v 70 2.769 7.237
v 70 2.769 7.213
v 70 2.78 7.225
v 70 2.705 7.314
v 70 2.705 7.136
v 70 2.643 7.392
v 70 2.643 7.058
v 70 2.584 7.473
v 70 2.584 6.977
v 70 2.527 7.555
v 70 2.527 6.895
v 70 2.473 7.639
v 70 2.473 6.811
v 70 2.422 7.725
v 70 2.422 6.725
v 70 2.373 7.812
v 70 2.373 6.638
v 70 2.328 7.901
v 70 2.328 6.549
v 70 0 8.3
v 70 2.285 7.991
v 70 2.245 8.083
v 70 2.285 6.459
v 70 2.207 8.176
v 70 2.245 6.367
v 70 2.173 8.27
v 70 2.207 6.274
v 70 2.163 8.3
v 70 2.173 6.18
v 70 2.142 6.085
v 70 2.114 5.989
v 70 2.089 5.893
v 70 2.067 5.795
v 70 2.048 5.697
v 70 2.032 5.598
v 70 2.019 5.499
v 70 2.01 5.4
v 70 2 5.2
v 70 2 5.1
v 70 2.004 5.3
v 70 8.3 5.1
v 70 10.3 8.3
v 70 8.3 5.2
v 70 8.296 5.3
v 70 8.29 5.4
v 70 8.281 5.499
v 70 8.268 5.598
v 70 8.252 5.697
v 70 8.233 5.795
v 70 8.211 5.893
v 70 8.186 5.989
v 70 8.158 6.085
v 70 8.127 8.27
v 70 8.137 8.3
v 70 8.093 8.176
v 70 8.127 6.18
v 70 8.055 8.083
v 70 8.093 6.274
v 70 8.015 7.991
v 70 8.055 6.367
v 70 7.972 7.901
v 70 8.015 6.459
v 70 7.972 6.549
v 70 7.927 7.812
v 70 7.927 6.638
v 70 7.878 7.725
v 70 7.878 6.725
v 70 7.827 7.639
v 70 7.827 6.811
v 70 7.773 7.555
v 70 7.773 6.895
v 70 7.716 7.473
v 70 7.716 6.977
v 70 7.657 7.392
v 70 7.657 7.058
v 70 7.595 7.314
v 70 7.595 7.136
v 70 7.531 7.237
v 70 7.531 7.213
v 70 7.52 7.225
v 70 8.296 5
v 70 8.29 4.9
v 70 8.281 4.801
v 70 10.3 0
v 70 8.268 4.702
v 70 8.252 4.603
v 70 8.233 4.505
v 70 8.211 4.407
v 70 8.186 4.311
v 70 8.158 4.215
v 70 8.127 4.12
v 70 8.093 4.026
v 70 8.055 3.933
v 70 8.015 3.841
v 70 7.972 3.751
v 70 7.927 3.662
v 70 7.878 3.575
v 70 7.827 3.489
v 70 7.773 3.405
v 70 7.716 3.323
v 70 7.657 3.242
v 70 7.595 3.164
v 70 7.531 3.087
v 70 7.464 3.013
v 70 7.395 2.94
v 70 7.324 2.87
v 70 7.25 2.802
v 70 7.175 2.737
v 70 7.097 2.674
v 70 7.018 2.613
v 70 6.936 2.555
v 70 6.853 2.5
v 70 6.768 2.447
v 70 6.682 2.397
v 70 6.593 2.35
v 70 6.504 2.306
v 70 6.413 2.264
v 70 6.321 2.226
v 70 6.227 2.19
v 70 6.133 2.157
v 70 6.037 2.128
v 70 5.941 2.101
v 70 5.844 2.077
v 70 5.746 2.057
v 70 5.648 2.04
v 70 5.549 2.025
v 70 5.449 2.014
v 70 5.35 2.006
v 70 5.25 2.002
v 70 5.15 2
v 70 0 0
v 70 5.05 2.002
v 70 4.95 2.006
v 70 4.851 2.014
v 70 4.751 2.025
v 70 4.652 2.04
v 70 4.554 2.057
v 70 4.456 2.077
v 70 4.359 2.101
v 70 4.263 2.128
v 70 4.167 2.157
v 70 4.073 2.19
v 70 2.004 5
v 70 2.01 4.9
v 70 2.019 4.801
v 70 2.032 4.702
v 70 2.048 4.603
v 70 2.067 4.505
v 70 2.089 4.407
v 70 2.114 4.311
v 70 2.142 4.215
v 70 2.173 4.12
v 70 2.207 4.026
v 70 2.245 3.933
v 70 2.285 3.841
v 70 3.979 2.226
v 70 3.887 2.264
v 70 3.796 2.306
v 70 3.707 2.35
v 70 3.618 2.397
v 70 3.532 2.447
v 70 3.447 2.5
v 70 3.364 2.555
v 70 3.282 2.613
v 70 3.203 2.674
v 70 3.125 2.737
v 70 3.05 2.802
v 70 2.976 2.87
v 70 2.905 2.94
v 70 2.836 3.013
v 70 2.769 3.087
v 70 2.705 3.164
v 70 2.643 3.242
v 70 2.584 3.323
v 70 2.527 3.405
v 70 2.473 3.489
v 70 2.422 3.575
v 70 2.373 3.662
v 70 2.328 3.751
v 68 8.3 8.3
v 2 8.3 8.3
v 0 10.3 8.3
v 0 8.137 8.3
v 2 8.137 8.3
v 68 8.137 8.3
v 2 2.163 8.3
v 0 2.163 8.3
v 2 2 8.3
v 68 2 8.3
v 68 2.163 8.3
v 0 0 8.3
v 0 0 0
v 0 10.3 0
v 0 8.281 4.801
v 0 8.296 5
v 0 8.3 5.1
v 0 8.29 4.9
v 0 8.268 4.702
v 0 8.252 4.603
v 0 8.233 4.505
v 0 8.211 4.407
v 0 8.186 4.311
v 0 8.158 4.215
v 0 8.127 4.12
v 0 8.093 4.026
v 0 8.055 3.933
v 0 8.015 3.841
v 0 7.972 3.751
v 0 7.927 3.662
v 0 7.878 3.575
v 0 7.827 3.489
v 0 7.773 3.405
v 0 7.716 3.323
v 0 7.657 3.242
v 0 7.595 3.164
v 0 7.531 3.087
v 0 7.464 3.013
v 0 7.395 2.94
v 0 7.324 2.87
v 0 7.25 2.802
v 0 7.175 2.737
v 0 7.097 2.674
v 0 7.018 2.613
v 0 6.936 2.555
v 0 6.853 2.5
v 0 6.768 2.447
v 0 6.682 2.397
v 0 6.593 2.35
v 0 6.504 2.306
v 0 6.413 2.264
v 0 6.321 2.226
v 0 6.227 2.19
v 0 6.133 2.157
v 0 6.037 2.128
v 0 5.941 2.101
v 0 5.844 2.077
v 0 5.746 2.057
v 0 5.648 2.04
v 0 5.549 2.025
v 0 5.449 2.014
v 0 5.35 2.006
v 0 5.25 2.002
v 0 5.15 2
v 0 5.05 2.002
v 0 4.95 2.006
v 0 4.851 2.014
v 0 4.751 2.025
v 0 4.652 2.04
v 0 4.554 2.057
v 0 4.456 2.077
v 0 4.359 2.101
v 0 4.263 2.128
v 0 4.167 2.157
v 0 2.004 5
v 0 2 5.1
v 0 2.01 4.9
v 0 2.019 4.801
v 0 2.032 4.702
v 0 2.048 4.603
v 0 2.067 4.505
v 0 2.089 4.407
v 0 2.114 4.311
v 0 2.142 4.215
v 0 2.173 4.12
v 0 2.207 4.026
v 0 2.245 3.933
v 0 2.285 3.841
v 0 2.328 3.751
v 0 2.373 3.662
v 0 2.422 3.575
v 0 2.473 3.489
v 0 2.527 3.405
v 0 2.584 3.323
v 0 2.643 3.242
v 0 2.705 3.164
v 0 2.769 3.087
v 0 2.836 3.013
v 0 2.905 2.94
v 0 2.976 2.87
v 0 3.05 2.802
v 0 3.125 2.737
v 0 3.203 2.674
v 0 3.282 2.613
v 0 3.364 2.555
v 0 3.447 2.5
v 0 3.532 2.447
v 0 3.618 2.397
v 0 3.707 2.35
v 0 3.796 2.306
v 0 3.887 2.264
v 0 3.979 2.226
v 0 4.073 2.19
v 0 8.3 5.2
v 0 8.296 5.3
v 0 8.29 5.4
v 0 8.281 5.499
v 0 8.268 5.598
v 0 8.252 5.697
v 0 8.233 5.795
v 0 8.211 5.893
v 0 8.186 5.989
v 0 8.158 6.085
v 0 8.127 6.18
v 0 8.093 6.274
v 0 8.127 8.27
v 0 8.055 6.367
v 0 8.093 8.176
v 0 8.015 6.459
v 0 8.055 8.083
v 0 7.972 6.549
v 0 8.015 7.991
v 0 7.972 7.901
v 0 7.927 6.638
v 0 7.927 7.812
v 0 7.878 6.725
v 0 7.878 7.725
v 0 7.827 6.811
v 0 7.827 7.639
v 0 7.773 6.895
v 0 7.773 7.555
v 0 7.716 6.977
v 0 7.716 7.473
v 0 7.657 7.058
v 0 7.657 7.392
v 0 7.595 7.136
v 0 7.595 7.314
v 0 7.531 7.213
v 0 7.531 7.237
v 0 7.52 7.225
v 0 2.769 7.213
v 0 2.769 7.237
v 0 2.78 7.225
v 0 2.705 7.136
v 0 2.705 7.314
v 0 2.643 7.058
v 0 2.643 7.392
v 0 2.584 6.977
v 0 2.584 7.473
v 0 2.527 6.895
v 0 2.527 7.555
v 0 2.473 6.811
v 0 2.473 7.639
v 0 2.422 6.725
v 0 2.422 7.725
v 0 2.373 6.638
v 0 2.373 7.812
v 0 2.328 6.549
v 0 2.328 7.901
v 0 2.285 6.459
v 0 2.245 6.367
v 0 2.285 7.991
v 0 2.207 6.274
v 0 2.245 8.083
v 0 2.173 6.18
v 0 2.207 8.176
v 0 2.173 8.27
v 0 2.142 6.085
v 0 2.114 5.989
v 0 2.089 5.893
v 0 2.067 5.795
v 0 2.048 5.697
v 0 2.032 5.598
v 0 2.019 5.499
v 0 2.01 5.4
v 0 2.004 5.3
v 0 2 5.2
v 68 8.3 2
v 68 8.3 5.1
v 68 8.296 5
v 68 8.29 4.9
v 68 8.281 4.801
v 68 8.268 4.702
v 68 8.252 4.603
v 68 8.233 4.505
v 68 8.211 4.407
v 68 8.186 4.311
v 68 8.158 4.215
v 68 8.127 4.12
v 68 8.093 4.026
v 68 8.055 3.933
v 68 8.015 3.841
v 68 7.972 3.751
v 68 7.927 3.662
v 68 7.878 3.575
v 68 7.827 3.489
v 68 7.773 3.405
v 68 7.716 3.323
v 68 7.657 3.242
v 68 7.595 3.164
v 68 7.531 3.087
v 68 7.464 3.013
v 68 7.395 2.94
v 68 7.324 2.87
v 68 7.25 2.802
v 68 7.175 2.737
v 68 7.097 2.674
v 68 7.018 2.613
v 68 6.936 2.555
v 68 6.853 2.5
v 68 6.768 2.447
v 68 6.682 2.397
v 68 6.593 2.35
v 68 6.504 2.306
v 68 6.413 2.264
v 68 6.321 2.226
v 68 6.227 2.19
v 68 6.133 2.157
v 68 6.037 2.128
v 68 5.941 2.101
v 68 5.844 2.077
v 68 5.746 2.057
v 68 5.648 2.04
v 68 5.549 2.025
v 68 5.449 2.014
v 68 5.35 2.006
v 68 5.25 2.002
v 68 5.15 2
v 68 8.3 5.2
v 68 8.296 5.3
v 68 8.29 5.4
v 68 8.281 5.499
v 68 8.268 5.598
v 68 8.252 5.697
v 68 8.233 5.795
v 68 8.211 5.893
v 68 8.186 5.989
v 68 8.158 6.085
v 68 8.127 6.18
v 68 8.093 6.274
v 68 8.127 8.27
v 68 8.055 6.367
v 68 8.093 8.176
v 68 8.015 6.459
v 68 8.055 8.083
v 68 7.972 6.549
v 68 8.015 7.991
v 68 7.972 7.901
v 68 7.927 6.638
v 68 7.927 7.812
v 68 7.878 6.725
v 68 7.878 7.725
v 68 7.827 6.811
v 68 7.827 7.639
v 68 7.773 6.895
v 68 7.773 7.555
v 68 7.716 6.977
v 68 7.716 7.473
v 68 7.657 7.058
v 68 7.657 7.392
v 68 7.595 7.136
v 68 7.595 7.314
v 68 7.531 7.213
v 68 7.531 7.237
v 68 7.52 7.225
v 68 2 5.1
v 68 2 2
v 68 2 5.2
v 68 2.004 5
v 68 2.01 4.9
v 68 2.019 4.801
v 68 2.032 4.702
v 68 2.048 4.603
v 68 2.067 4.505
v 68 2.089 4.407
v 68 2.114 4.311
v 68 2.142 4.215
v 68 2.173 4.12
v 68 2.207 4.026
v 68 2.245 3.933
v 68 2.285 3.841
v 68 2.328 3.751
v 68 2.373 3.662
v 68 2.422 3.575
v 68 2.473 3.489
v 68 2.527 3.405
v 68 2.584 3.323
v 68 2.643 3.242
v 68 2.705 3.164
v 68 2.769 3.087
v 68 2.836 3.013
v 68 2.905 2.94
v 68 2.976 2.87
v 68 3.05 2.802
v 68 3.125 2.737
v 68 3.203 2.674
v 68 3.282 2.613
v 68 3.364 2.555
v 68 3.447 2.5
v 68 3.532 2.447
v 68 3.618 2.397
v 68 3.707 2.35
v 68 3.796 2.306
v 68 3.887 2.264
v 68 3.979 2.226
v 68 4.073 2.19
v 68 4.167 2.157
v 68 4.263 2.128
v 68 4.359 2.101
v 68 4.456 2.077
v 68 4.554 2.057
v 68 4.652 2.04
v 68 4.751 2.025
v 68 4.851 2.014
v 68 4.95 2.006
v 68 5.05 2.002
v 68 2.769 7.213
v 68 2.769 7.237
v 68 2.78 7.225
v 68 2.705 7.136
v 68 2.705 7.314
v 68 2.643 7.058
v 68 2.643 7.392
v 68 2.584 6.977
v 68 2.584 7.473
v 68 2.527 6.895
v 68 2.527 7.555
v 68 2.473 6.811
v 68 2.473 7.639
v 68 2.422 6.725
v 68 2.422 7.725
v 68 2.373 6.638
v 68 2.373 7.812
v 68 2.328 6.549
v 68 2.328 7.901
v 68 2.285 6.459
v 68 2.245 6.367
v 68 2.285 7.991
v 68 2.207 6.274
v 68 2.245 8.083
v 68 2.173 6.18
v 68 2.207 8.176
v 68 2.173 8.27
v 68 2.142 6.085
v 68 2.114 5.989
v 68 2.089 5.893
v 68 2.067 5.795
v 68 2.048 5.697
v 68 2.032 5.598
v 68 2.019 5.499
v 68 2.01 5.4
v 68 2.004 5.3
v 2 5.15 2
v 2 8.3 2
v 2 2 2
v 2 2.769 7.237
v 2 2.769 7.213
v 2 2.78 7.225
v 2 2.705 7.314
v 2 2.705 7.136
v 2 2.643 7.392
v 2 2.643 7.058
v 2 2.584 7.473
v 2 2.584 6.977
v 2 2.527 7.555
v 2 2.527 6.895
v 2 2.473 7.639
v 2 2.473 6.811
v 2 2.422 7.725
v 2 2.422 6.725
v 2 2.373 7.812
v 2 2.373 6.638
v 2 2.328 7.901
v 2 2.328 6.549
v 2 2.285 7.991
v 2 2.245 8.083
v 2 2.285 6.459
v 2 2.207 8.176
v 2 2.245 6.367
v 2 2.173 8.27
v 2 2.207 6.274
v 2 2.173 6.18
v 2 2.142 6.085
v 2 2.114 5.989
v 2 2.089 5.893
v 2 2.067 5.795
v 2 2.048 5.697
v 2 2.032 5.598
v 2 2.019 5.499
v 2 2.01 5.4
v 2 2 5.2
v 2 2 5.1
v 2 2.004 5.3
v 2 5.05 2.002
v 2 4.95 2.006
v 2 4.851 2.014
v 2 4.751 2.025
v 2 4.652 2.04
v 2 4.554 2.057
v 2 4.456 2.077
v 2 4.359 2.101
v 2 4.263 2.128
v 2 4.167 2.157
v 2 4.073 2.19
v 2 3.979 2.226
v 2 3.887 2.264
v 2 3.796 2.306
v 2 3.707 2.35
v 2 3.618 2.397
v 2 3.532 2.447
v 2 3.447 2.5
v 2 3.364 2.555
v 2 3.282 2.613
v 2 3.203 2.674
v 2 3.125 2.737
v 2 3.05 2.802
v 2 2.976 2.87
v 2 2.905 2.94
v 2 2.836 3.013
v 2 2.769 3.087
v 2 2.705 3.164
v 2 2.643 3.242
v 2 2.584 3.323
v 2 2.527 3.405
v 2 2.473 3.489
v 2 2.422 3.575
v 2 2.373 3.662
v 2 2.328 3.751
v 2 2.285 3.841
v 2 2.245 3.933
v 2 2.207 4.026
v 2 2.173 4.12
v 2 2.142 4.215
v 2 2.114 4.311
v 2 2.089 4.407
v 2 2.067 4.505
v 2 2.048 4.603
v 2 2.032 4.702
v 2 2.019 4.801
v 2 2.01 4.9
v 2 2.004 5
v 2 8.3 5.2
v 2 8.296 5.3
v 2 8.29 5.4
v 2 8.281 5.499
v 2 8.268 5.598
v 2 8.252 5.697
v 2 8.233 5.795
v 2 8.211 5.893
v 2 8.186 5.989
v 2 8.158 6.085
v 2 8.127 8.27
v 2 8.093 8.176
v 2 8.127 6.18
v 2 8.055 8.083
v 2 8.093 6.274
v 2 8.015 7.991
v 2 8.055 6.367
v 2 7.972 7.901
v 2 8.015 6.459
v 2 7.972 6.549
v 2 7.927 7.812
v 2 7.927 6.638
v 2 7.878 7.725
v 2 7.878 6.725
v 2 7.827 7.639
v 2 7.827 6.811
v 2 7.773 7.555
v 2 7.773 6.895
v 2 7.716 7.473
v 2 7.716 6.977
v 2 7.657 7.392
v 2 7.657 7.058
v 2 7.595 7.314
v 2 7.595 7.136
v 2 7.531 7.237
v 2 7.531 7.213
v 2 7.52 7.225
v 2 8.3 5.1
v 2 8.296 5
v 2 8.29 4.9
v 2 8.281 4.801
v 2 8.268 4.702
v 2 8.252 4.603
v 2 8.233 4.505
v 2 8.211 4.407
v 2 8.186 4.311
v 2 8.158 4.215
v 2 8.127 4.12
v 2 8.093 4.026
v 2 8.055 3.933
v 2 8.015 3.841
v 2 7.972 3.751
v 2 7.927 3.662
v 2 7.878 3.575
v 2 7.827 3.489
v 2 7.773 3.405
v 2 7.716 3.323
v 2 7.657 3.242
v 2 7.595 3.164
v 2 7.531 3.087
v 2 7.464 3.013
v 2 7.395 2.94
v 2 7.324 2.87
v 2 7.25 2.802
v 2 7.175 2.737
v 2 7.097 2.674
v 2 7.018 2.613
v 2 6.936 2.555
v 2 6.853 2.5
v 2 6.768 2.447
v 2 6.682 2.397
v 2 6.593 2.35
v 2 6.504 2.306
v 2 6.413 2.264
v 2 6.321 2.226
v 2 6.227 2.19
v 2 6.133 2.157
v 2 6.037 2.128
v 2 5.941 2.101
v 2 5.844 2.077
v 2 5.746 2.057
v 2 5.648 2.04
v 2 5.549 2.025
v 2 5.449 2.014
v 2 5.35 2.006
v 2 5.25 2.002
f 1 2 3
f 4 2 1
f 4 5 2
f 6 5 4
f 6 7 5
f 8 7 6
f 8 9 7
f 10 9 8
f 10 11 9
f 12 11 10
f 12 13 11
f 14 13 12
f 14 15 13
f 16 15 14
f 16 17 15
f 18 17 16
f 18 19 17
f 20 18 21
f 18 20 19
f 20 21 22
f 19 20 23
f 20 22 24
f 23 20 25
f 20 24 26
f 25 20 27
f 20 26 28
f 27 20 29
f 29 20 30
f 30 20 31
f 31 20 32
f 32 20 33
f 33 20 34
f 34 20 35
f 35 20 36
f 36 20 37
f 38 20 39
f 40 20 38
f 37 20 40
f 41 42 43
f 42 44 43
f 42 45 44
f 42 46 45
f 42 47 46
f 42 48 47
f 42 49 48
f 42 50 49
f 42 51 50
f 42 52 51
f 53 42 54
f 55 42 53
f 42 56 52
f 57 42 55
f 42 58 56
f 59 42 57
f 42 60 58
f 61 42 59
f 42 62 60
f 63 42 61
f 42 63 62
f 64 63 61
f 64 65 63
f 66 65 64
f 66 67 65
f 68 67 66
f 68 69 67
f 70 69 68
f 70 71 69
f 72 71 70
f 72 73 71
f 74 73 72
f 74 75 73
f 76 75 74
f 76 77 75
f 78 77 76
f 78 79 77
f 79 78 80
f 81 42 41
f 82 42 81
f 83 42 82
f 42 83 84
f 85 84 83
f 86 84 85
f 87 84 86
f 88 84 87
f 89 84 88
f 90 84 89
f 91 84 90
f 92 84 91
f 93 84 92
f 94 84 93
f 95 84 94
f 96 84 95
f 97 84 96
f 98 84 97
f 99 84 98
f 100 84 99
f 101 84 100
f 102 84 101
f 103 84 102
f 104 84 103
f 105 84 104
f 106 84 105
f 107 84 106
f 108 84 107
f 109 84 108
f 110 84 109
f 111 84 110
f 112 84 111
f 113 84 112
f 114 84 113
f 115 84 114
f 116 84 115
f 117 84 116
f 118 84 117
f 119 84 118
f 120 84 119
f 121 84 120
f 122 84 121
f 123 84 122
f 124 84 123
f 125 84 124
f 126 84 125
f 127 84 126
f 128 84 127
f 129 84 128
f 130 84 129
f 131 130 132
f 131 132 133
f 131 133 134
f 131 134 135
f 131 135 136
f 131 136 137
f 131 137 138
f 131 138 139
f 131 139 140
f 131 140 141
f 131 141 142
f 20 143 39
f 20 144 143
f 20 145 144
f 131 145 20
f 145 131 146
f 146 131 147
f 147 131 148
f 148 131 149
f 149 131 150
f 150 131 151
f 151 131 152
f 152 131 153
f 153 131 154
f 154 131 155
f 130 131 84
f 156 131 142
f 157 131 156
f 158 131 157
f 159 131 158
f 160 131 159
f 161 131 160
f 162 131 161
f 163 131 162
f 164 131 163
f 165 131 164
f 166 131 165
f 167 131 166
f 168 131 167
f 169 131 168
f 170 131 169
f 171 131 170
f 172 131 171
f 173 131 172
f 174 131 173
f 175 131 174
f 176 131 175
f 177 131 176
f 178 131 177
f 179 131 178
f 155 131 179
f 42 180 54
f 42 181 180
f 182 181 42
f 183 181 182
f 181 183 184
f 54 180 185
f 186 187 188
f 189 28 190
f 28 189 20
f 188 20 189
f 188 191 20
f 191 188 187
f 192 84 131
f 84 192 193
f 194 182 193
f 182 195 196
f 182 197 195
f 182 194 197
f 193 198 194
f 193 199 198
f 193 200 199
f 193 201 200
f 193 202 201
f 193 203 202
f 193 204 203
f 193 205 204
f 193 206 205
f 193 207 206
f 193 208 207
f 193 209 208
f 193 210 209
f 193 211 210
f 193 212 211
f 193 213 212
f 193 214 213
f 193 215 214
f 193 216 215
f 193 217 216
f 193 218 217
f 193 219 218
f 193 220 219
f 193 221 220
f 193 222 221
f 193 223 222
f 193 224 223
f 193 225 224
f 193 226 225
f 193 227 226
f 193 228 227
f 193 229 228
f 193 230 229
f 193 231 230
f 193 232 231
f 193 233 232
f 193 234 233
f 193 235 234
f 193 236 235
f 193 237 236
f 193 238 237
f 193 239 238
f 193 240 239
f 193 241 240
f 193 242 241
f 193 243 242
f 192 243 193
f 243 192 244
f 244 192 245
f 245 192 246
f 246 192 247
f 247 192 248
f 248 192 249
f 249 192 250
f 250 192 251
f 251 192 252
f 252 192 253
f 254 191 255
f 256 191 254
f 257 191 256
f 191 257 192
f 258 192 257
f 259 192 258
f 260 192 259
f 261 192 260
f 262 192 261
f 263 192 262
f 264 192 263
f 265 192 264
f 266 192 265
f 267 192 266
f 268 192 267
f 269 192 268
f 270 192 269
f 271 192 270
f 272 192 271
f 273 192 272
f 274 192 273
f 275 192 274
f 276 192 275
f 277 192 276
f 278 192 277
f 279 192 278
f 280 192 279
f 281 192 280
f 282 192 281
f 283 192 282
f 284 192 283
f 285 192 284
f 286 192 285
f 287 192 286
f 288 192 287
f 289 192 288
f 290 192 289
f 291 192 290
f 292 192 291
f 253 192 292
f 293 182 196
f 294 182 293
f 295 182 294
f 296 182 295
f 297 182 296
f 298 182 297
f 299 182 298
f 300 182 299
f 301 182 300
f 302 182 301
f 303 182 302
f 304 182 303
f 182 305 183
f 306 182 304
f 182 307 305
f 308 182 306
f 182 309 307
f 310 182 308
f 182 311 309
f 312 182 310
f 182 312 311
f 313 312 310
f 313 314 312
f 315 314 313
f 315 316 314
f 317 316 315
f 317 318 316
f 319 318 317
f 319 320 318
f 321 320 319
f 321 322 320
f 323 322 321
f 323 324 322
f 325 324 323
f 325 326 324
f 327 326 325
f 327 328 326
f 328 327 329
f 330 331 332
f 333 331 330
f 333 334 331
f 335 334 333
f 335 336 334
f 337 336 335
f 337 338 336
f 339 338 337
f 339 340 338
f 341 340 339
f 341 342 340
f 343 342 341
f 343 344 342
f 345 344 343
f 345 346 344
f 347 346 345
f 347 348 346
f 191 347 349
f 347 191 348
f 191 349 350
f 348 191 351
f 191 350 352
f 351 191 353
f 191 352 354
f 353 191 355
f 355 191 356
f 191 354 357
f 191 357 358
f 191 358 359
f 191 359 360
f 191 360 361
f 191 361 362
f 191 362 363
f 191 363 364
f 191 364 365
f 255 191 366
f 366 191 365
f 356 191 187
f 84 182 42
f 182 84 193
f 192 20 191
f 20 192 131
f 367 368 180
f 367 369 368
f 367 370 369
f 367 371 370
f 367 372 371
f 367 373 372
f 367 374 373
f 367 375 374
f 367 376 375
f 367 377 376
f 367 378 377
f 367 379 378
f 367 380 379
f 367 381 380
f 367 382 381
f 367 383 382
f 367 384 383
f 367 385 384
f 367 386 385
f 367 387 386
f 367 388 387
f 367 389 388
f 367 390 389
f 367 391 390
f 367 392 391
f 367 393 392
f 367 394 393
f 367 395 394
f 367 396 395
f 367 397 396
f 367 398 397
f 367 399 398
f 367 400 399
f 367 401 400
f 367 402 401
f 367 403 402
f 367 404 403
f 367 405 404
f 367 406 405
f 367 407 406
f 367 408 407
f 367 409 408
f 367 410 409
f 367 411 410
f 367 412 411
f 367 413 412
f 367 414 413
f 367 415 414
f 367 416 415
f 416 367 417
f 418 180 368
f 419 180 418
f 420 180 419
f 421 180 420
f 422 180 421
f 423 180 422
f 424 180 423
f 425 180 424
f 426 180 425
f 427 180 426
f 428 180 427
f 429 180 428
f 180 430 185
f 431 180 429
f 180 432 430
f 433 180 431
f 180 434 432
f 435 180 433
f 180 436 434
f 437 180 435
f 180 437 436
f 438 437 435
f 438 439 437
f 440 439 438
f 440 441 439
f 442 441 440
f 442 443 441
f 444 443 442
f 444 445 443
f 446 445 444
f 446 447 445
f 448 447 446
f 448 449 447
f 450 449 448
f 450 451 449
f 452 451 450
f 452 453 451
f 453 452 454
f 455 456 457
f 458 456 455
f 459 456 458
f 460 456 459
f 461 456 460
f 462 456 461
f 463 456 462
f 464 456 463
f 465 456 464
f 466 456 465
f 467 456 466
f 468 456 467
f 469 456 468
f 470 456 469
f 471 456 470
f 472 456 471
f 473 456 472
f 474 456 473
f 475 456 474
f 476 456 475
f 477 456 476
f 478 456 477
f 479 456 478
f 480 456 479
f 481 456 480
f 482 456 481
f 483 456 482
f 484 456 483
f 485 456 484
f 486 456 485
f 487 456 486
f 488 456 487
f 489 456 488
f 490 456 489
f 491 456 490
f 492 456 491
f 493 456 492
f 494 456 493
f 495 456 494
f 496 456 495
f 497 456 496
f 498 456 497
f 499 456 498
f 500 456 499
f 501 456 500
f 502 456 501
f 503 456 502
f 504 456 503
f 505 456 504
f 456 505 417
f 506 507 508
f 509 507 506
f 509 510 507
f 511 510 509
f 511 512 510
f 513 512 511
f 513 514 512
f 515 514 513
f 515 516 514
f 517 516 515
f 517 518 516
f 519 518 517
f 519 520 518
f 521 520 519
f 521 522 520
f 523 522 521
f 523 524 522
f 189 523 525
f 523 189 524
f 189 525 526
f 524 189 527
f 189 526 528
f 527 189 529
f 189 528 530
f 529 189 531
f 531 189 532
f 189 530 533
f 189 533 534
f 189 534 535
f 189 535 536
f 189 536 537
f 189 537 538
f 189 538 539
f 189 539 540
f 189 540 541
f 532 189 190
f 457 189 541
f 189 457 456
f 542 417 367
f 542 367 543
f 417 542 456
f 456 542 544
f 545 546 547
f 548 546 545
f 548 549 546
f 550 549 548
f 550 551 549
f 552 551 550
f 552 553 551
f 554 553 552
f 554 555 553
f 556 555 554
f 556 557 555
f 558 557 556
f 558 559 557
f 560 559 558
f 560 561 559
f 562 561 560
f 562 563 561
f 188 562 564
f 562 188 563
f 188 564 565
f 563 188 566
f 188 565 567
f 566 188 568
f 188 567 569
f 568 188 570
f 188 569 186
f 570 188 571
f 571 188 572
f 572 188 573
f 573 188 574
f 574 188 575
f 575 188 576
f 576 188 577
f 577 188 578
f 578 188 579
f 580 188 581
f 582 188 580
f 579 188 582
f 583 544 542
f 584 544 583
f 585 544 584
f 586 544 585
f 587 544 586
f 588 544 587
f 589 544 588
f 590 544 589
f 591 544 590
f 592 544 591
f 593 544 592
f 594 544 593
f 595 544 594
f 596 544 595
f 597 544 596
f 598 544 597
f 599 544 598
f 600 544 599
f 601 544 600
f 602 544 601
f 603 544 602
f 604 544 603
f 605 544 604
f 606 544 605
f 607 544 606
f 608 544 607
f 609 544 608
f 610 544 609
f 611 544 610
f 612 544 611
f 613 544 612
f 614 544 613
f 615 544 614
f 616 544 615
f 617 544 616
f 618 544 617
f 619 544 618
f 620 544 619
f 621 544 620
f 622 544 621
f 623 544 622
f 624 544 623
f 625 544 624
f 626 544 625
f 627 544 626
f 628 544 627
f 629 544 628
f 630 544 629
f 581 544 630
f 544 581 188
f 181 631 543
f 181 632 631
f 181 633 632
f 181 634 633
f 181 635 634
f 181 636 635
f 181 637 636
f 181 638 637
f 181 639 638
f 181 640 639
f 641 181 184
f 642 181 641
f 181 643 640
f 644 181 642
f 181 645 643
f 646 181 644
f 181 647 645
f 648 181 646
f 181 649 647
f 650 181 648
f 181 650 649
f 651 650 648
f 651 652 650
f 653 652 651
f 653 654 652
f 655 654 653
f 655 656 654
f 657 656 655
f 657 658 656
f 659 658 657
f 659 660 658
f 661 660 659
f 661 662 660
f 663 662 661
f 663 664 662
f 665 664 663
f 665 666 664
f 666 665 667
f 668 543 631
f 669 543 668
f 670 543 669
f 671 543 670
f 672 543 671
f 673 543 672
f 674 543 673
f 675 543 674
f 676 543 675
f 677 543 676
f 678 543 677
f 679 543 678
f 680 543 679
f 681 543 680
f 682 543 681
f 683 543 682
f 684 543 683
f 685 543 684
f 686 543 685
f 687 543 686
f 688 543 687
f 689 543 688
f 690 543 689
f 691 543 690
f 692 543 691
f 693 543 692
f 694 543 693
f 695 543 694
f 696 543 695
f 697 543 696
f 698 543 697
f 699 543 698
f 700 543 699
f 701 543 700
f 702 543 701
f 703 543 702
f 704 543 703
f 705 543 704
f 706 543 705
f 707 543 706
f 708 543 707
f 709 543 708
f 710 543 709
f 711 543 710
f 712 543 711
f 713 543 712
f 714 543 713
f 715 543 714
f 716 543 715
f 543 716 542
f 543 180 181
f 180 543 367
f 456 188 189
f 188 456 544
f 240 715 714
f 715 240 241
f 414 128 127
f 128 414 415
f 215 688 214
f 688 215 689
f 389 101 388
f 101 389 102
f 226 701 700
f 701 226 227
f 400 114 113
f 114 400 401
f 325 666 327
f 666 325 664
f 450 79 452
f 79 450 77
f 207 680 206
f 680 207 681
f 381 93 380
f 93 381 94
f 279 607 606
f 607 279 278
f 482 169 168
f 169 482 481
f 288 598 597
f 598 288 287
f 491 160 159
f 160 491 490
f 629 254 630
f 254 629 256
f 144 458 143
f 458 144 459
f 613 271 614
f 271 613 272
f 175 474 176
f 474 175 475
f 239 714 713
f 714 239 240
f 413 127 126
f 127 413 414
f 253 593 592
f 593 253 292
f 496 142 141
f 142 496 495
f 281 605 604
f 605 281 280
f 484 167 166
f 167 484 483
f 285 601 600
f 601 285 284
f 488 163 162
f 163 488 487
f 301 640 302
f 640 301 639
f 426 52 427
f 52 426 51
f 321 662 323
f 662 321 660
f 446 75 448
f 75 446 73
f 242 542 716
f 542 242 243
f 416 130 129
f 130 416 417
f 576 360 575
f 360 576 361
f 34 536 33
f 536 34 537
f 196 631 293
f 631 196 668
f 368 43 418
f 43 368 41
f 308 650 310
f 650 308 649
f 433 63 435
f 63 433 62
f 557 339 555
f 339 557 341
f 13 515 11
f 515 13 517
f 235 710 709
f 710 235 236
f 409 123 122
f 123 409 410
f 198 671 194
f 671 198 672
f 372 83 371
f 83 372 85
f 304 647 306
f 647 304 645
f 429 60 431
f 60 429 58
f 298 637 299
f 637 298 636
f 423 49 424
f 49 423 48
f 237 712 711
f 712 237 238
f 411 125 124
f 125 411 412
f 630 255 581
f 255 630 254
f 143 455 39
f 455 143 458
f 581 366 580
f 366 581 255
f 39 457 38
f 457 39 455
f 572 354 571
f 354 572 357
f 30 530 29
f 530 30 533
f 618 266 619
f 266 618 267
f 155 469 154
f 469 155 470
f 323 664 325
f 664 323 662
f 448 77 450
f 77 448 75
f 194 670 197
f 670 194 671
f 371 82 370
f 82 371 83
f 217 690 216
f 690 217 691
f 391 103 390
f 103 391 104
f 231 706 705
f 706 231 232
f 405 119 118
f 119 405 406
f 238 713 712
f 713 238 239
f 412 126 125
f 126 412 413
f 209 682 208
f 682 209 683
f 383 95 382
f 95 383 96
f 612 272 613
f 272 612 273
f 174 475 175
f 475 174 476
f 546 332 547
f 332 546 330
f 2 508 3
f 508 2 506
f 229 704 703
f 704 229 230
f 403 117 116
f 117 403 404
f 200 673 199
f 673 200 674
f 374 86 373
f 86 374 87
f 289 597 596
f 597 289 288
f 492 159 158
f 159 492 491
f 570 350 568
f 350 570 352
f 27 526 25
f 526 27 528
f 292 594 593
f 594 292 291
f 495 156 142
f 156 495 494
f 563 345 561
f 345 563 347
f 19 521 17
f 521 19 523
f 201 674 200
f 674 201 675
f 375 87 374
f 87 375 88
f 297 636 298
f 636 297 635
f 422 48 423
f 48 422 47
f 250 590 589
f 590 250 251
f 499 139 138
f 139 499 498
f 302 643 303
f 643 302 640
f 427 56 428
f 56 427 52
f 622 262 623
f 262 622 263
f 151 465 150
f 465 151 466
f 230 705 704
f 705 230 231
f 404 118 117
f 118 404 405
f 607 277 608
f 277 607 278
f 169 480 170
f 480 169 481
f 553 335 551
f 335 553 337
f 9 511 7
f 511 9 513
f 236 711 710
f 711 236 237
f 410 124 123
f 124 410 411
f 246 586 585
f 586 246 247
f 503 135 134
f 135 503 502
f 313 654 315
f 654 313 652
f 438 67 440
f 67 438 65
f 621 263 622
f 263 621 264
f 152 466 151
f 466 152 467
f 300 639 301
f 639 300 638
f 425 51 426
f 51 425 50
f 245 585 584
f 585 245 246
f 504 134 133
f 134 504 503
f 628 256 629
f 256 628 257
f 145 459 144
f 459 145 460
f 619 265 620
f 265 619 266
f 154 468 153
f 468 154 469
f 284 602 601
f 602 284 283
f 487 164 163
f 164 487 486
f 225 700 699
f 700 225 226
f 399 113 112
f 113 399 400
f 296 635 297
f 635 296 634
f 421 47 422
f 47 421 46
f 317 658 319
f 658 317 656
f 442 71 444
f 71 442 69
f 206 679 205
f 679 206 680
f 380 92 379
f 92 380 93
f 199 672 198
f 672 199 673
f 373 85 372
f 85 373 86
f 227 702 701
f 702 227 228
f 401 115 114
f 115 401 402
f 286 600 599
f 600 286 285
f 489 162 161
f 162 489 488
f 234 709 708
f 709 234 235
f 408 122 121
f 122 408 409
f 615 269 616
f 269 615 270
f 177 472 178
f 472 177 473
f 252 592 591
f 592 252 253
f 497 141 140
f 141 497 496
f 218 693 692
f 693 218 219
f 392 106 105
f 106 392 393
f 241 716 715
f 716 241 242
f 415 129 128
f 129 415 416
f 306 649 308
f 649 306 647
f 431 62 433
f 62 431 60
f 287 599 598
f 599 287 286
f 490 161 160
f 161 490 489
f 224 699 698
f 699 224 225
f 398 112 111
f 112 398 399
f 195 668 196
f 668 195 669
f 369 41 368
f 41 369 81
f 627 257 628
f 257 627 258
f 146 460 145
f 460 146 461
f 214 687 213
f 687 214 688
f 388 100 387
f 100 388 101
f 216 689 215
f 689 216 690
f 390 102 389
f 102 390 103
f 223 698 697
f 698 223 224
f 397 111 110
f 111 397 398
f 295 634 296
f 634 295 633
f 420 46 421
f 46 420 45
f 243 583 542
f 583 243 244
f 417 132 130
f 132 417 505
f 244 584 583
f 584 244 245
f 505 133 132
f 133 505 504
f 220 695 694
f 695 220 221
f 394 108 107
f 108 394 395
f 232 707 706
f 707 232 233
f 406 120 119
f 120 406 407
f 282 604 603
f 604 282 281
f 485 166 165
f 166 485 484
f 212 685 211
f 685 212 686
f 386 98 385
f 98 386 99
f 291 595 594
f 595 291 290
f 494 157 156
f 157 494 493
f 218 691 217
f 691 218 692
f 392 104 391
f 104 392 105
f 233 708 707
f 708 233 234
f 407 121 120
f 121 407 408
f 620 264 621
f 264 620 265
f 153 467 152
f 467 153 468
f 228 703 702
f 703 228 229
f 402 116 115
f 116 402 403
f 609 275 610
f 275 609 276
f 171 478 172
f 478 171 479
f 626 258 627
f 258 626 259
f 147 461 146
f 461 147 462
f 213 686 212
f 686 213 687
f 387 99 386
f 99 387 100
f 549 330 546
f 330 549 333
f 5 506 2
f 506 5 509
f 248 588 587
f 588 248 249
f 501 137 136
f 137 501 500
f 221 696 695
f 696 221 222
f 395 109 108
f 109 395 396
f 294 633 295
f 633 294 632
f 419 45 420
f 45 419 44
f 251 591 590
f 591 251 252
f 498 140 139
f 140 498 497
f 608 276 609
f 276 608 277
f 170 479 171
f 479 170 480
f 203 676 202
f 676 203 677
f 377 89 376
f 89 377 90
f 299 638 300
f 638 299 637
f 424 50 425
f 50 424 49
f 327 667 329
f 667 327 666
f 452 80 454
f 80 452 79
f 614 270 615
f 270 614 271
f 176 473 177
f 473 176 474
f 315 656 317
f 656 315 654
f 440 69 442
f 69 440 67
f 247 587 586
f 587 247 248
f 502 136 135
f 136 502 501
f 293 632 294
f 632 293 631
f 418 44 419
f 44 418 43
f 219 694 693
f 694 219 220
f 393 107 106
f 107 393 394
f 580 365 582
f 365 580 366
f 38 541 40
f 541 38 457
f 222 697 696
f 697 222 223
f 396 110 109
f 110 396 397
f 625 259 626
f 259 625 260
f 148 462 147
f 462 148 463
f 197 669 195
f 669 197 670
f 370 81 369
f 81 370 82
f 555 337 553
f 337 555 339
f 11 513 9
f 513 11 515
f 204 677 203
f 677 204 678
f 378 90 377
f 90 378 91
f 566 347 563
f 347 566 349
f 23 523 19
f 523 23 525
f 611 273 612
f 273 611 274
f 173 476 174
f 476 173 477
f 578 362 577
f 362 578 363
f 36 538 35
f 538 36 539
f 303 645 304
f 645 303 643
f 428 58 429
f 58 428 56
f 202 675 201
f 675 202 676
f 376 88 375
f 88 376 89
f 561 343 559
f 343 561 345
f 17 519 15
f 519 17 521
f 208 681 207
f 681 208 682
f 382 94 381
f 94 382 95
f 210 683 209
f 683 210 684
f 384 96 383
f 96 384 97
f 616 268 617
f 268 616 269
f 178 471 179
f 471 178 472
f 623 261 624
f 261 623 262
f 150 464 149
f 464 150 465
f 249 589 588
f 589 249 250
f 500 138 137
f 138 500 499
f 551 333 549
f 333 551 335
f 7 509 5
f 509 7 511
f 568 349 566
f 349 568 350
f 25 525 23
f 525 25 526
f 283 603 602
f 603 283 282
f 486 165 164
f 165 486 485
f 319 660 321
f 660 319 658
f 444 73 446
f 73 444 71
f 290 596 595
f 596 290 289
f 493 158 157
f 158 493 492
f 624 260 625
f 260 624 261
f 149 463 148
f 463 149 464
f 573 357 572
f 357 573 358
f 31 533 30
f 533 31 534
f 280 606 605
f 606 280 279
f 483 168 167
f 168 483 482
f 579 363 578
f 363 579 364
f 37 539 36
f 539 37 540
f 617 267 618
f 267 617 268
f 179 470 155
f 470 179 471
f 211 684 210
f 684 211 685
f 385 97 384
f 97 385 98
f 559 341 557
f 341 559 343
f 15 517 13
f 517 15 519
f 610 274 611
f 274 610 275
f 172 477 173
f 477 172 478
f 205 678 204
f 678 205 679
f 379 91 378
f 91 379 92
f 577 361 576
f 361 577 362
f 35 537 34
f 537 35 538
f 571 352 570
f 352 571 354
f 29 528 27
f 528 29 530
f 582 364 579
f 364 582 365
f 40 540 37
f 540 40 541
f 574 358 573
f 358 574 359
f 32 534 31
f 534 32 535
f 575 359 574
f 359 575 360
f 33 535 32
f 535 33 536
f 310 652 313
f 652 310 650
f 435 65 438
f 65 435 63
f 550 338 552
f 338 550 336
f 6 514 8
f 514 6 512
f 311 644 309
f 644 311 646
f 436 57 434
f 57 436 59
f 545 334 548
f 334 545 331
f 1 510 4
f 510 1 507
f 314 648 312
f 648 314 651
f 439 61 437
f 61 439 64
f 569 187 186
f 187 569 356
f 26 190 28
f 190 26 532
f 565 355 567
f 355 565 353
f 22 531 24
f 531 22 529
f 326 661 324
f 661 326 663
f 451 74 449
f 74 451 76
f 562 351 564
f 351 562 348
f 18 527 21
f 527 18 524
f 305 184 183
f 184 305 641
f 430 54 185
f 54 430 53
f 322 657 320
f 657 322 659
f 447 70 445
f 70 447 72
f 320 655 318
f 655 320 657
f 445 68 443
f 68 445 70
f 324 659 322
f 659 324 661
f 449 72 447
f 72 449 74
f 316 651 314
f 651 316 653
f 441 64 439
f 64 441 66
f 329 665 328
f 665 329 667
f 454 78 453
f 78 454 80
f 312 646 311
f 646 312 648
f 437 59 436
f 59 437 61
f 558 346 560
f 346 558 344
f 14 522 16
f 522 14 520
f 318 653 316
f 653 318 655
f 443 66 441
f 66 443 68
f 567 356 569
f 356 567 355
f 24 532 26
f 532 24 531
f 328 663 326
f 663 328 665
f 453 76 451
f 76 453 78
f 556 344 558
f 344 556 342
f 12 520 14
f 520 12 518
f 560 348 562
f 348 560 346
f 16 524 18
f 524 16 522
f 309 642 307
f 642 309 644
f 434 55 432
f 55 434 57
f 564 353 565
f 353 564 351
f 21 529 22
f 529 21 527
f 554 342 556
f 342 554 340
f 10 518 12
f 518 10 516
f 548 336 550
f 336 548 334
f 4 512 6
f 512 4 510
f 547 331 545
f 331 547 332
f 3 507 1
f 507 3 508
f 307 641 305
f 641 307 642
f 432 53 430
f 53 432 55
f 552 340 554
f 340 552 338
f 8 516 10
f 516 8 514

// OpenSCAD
// Stem Diameter
d = 6.3;
// Support Length
l = 70;
// Support Thickness
t = 2;

$fa = 0.1;
$fs = 0.1;

difference() {
	cube([l, d + (2 * t), d + t]);
	translate([t, t, t])
	cube([l - (2 * t), d, d + 0.1]);
	rotate([0, 90, 0])
	translate([-t - (d / 2), t + (d / 2), -0.1])
	cylinder(r = d / 2, h = l + 0.2);
	rotate([0, 90, 0])
	translate([-t - d - 1, t + (d / 2), -0.1])
	cylinder(r = d / 2, h = l + 0.2);
}
